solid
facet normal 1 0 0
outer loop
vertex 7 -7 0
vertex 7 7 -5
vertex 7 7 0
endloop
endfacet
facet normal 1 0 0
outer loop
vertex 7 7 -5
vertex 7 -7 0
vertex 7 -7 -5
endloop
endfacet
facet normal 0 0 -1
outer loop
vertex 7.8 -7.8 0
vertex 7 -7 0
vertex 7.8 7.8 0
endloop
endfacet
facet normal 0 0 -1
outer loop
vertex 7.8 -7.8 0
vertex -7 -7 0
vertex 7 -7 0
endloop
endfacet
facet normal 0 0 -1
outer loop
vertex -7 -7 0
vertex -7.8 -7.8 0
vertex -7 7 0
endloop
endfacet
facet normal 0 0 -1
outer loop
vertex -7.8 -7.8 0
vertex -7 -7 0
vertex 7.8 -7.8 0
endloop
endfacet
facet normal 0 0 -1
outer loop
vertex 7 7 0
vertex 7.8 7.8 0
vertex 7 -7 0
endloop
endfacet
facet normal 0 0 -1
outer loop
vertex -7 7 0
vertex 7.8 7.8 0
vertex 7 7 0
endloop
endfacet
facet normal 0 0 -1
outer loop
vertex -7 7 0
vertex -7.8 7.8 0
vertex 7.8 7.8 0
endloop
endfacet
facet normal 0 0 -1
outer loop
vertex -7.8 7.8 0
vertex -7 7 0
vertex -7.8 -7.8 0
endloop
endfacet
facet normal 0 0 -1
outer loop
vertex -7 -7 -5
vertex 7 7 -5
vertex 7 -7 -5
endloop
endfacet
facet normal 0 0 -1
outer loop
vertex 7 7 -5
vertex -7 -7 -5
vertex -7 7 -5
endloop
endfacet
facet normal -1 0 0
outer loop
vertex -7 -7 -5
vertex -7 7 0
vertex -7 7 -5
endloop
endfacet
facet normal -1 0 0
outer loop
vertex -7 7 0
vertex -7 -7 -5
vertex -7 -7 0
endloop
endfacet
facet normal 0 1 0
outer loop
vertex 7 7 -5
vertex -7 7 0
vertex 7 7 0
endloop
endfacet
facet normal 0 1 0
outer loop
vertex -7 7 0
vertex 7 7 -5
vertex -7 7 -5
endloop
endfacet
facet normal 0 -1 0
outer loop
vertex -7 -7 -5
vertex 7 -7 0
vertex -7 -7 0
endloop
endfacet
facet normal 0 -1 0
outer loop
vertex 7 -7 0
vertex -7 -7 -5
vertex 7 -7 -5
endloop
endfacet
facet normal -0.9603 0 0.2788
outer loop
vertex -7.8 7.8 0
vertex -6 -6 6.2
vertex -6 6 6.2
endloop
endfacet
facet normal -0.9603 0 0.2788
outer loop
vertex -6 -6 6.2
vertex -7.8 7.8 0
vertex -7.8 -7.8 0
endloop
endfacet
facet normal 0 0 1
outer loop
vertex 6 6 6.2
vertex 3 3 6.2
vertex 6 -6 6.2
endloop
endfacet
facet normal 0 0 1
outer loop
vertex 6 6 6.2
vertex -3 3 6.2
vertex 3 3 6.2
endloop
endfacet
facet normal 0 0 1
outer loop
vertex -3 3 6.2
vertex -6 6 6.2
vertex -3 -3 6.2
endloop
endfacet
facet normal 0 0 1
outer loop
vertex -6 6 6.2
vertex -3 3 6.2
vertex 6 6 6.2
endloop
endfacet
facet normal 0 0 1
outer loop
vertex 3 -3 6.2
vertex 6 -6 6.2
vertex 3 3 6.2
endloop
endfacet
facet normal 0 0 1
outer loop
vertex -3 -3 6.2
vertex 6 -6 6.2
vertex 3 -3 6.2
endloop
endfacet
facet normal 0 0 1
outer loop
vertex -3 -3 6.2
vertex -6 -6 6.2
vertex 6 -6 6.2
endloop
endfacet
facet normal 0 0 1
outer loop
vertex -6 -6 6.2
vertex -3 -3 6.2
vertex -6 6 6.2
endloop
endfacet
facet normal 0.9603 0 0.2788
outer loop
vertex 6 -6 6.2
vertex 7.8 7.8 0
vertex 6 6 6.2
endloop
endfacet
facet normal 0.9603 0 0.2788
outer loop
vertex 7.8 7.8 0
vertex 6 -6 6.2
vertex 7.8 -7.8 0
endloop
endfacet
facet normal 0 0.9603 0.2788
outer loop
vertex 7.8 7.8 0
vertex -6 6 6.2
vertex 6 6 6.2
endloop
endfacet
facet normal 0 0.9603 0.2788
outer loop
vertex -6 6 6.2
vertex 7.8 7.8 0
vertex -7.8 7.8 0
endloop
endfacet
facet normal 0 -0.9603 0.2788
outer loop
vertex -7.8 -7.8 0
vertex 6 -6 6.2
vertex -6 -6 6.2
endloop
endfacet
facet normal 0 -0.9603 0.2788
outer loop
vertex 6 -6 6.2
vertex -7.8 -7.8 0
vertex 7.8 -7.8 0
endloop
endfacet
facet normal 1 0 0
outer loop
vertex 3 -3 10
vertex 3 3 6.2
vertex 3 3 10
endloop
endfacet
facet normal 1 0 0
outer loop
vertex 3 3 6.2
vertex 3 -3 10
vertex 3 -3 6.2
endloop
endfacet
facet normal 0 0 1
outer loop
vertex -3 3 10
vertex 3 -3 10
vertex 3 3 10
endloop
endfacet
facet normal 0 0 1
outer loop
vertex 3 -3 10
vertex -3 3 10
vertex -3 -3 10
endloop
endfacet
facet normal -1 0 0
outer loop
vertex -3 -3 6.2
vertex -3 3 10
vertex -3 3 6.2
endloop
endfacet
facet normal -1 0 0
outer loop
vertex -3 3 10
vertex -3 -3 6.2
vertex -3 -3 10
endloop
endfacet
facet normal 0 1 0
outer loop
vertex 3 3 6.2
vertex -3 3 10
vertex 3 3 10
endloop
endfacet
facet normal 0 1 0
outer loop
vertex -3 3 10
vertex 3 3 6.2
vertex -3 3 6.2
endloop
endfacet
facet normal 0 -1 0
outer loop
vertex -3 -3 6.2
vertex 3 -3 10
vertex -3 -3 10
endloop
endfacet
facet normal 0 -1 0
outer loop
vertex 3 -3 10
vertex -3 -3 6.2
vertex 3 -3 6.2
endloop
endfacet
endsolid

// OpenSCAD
// Parameters
base_width = 14;  
base_height = 5;
cover_bottom_width = 15.6;  
cover_top_width = 12;   
cover_height = 6.2;       
stem_width = 6;          
stem_height = 3.8;         

module switch() {
    // Base part
    translate([0, 0, -base_height / 2])
        cube([base_width, base_width, base_height], center = true);
    
    // Cover (using linear_extrude)
    linear_extrude(height = cover_height, scale = cover_top_width / cover_bottom_width)
        square([cover_bottom_width, cover_bottom_width], center = true);

    // Stem
    translate([0, 0, cover_height + stem_height/2])
        cube([stem_width, stem_width, stem_height], center = true);
}

// Render the switch
switch();
